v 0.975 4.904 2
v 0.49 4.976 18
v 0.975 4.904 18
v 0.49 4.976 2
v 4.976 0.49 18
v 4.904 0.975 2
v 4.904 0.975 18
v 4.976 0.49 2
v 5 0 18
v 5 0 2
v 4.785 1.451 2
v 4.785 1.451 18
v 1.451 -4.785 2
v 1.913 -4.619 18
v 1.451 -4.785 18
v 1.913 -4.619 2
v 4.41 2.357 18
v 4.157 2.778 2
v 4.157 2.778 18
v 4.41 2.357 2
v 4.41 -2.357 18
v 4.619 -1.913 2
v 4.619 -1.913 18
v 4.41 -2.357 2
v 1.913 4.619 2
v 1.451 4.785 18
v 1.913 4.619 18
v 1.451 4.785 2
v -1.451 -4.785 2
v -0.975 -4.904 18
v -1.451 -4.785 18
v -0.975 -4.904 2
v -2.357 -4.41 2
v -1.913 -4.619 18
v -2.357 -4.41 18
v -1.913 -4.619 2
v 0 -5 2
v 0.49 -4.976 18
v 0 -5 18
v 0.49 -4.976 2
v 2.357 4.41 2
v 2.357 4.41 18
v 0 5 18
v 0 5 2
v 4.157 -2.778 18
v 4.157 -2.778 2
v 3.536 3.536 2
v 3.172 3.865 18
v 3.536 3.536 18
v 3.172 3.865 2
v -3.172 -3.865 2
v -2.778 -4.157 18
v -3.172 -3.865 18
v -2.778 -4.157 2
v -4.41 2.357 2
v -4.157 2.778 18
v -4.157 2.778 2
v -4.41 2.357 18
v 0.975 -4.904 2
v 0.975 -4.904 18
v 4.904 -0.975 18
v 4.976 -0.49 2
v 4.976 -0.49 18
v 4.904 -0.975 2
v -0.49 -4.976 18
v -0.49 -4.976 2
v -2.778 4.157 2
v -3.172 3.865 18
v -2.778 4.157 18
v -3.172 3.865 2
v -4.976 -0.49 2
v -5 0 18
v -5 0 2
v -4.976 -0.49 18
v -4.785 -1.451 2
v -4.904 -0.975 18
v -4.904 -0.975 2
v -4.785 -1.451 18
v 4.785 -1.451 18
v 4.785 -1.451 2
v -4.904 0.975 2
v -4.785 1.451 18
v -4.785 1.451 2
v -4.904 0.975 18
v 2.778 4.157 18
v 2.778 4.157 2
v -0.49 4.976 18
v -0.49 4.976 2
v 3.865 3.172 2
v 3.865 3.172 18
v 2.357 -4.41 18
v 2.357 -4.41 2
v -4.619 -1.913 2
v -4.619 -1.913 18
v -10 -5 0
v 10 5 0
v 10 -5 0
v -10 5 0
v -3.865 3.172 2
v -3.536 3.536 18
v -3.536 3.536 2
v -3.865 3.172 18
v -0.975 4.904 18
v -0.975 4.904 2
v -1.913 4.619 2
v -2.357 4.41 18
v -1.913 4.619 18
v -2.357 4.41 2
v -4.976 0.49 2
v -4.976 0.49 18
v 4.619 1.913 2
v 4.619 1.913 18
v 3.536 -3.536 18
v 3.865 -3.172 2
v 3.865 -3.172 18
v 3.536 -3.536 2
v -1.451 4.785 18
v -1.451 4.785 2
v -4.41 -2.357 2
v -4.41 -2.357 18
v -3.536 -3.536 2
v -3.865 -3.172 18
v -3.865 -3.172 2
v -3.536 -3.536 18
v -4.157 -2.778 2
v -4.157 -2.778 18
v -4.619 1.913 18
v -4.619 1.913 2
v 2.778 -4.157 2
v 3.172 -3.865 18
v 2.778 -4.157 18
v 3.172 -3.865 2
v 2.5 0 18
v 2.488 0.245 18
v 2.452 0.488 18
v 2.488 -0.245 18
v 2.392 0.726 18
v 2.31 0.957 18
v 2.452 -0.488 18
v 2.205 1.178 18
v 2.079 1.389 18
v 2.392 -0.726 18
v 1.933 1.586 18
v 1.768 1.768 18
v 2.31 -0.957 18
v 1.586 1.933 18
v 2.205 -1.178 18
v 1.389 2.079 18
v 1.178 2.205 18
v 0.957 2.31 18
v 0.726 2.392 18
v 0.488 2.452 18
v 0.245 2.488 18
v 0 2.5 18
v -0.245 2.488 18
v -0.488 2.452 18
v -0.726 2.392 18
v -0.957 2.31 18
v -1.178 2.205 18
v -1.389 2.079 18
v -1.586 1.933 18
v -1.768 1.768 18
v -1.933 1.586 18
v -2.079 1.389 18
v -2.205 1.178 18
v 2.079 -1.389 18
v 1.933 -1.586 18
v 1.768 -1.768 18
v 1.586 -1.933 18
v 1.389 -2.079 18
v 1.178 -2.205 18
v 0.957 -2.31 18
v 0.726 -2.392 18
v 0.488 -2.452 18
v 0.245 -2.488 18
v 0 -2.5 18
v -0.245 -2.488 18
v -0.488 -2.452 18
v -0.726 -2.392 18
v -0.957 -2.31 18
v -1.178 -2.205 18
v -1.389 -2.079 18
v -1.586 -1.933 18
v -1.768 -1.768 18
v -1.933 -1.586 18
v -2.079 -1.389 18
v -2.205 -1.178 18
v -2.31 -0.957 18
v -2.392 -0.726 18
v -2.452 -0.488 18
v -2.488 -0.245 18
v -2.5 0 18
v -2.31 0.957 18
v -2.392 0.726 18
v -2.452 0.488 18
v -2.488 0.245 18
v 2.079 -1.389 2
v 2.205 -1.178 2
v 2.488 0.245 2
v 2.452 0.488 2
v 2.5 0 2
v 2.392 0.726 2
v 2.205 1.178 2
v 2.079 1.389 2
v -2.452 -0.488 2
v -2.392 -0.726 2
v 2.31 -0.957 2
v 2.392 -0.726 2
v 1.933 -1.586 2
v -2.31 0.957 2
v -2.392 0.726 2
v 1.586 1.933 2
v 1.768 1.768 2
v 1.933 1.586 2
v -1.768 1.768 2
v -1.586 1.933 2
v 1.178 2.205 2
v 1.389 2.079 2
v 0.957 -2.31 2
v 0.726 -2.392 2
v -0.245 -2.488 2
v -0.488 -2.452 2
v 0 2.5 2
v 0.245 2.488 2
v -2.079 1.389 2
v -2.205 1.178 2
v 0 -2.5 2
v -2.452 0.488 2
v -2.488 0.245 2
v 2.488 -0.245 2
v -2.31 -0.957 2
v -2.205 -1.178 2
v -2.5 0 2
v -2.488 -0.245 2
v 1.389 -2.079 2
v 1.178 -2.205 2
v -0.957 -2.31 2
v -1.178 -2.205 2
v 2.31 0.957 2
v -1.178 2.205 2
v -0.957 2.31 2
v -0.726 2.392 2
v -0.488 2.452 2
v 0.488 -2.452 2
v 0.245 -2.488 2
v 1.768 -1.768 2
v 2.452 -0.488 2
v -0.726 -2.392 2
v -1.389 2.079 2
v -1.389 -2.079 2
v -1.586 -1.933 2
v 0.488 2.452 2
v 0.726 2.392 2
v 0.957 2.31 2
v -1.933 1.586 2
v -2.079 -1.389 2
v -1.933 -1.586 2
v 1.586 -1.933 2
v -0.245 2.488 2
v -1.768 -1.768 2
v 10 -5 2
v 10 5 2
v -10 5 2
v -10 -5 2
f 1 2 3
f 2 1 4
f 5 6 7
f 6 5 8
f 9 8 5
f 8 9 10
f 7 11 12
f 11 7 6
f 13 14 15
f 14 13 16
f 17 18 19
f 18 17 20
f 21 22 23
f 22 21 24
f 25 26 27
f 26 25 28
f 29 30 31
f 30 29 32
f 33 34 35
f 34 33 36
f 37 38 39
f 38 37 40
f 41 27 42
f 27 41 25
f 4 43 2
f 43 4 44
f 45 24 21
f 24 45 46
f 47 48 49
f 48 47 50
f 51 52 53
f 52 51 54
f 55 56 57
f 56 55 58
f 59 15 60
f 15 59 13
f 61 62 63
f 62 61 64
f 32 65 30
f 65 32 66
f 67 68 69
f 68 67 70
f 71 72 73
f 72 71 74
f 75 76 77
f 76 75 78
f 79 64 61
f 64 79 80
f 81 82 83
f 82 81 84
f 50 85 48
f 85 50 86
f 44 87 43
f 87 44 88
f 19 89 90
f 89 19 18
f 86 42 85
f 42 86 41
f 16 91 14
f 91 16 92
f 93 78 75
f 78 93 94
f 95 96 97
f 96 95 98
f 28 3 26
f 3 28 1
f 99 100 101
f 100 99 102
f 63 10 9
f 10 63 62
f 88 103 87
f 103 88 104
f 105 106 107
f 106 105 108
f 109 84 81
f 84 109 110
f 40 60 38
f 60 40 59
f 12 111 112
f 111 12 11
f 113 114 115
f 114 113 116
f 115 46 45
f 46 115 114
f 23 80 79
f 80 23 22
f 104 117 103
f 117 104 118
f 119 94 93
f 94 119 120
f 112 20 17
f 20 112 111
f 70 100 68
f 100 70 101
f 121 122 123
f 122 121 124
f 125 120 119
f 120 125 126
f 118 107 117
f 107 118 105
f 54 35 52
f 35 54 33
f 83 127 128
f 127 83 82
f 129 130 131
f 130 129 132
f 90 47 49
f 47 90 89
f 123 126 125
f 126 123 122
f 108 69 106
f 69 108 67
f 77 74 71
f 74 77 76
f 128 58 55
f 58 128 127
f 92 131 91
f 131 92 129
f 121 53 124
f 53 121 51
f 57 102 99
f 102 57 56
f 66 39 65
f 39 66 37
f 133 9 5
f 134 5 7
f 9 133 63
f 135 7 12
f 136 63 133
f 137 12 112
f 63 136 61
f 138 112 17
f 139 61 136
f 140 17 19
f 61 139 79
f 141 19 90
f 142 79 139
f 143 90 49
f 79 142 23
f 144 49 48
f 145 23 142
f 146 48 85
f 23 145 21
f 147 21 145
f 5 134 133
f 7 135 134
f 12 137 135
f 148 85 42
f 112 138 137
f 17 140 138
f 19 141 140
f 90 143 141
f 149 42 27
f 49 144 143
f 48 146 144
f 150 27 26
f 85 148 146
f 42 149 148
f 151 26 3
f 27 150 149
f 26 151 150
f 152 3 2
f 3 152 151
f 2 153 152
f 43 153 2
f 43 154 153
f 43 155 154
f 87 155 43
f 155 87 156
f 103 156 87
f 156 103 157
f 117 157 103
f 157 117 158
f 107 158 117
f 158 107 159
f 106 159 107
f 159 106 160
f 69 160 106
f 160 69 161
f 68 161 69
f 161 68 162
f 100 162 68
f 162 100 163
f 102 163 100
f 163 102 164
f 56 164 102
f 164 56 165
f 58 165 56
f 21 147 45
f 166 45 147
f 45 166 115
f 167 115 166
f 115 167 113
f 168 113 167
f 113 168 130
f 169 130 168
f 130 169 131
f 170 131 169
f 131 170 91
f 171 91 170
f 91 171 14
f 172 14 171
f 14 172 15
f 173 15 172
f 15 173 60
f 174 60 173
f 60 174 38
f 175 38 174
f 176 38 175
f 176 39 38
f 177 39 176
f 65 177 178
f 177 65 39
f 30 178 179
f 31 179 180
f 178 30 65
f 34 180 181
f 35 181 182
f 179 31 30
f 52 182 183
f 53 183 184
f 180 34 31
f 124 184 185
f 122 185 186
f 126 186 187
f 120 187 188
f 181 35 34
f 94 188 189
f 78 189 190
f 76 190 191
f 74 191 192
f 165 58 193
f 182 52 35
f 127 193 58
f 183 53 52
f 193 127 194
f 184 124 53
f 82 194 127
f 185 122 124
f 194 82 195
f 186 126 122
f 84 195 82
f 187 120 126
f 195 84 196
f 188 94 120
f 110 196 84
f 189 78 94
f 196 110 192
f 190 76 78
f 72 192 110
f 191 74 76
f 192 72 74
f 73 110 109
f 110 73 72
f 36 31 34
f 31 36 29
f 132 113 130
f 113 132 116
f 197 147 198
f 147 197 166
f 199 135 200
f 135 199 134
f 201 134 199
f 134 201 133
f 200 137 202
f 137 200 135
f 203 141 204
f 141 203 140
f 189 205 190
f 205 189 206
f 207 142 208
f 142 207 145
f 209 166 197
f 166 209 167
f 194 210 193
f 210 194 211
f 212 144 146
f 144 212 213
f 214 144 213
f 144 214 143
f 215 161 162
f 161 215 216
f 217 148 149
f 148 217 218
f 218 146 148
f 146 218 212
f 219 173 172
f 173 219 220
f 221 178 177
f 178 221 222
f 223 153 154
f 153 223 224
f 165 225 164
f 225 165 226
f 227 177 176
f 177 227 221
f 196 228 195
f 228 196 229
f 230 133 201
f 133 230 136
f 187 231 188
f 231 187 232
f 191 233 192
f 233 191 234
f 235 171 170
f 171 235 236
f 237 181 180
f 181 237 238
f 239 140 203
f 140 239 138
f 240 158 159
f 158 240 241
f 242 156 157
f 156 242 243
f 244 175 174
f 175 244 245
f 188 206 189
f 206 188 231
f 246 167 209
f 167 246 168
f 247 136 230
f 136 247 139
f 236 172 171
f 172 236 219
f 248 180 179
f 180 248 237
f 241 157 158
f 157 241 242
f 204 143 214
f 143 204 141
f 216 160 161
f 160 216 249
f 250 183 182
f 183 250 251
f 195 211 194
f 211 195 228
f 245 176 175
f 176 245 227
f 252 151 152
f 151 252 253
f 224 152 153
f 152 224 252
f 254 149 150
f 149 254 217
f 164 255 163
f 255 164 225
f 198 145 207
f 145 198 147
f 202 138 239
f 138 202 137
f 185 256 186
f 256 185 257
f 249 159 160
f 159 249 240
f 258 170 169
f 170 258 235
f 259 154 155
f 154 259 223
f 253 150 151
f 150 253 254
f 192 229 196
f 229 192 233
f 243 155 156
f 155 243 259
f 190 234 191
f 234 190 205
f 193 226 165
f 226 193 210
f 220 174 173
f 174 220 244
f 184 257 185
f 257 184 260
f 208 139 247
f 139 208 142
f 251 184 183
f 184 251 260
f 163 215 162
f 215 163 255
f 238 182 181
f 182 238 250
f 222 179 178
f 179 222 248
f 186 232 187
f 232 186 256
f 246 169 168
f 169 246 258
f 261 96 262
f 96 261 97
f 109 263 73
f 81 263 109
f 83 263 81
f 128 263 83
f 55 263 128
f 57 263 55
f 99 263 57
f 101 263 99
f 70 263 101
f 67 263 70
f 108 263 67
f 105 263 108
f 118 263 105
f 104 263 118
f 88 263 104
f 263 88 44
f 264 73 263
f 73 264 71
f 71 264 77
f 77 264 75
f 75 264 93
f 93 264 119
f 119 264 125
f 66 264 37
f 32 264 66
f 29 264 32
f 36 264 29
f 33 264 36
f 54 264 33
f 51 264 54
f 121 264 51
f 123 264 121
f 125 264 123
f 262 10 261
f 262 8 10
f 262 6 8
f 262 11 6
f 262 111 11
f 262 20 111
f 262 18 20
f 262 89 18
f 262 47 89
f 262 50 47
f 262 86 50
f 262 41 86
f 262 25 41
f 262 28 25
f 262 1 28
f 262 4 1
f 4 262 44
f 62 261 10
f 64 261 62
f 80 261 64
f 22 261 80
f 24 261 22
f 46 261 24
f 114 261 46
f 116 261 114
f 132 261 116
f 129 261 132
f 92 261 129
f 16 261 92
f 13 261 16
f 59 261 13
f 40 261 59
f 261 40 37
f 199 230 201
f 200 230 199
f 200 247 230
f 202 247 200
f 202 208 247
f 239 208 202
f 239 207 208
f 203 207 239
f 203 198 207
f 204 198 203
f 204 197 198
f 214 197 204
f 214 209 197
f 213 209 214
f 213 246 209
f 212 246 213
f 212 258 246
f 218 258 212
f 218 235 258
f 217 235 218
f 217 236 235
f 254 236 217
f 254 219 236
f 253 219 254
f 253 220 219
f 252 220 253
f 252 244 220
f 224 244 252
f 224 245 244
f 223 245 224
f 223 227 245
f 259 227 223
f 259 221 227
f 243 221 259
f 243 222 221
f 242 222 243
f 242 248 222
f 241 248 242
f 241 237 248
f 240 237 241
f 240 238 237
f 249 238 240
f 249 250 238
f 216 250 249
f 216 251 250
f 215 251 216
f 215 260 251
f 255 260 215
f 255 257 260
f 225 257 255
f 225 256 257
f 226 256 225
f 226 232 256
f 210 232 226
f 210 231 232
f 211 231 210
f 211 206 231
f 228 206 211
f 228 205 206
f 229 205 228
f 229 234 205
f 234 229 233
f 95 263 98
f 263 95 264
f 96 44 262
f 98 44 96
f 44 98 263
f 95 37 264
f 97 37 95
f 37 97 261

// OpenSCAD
// ESPHome Boiler Monitor sensor holder for BPW40/BPW77 phototransistor
$fn = 64;
outer_d = 10;
inner_d = 5;
length = 18;

difference() {
  cylinder(h=length, d=outer_d);
  translate([0,0,-1]) cylinder(h=length+2, d=inner_d);
}

translate([-10,-5,0])
  cube([20,10,2]);
